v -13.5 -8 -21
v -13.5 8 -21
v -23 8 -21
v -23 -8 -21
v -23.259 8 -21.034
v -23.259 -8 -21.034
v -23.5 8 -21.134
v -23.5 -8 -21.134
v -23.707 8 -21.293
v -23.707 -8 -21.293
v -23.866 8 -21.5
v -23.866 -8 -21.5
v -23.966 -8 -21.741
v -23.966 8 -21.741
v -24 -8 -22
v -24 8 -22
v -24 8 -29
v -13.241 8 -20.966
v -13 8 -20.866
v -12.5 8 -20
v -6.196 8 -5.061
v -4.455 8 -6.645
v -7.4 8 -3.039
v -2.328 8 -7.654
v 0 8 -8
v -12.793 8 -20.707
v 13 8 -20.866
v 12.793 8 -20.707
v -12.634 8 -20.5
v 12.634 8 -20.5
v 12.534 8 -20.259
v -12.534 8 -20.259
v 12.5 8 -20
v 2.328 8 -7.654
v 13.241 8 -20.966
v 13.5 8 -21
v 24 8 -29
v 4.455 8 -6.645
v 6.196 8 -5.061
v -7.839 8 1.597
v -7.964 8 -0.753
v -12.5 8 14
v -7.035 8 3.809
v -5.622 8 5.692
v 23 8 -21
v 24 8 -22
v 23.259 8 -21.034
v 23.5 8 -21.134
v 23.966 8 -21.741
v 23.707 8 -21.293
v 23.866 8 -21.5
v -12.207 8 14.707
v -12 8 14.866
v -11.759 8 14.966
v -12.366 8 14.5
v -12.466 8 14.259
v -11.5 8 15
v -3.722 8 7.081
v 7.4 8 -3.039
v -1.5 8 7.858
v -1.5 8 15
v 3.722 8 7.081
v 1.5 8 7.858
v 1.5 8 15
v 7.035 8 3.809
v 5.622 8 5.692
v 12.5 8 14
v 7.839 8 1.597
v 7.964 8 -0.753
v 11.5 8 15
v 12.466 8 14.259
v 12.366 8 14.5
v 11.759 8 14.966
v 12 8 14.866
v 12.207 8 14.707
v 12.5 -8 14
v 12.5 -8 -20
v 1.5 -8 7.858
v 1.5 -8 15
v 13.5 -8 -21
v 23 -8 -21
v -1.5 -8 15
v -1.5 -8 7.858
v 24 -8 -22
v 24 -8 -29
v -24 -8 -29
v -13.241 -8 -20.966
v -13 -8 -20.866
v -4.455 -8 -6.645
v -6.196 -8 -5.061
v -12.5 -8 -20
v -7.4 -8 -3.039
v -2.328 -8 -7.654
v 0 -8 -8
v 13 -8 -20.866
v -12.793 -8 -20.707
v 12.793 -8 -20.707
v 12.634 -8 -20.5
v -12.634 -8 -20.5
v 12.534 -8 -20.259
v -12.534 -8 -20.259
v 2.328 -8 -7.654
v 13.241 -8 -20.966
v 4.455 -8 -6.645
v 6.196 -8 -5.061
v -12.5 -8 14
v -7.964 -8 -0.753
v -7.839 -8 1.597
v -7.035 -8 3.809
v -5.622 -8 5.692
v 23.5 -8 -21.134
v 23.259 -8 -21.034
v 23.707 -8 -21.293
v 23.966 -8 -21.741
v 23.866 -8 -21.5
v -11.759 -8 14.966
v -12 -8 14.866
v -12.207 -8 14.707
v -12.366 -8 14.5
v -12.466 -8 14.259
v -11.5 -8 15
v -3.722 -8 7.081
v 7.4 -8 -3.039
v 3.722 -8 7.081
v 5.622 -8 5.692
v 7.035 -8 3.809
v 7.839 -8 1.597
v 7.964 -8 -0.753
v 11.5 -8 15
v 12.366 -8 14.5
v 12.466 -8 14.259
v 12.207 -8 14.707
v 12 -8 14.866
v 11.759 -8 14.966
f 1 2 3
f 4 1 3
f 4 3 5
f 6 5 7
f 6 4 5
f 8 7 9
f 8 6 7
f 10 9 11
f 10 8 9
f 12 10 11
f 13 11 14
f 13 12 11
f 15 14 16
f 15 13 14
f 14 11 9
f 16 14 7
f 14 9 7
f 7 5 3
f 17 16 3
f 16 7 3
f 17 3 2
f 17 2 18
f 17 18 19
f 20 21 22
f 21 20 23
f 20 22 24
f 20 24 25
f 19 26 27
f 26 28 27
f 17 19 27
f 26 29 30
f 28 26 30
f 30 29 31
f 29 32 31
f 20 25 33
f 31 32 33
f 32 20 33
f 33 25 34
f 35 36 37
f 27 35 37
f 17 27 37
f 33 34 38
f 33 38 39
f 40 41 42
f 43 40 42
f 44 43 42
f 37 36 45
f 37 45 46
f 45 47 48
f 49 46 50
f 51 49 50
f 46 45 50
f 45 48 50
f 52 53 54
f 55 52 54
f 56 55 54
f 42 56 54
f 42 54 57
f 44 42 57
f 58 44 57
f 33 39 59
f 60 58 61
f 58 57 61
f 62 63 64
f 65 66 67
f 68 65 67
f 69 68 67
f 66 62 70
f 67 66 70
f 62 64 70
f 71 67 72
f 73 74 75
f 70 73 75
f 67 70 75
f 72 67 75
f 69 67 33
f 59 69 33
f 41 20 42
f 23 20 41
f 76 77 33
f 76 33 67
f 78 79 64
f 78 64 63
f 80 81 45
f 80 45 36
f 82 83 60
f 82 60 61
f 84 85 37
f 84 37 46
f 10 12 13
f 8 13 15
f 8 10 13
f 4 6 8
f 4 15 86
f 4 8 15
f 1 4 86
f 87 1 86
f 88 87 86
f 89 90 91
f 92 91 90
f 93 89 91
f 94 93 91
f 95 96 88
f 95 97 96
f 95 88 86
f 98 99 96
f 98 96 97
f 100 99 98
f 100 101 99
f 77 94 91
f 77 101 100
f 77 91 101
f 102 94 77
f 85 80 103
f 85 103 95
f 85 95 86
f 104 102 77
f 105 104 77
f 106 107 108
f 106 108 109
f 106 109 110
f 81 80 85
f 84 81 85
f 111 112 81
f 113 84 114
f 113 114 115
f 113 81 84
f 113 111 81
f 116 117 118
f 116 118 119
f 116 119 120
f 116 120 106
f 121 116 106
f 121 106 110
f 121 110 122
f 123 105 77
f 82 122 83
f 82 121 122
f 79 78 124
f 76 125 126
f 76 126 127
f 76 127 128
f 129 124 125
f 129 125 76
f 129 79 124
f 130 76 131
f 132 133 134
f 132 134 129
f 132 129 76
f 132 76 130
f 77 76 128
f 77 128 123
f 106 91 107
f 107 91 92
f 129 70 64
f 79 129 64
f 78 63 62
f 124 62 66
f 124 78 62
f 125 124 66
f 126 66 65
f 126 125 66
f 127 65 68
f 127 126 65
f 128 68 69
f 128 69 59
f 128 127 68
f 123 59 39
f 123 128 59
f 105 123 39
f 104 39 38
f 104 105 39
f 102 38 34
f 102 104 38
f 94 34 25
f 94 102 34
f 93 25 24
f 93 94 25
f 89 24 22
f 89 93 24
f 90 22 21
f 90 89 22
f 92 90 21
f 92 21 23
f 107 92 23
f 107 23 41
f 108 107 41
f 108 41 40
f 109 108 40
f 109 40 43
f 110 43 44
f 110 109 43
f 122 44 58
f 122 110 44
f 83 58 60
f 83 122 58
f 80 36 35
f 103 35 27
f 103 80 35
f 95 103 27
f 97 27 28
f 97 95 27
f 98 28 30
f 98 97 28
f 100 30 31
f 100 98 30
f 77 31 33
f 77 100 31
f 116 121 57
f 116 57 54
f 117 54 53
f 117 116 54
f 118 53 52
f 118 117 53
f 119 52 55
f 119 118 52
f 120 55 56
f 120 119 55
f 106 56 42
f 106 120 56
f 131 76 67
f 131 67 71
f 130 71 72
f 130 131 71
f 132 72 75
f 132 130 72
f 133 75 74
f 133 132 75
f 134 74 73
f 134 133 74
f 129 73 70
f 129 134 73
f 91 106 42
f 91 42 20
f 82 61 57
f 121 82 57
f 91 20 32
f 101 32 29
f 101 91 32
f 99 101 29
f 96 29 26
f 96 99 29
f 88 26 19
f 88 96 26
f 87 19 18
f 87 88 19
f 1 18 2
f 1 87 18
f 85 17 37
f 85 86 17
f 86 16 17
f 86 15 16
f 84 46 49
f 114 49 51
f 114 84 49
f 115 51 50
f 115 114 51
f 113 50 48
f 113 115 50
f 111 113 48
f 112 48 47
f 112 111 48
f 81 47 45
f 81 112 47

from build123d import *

# Parameters (mm, degrees)
F1_DEPTH = 8


with BuildPart() as f1:
    # F0 (on Front) → F1 (new body, symmetric)
    with BuildSketch(Plane.XZ):
        with BuildLine():
            Line((-24, -29), (24, -29))
            Line((24, -29), (24, -22))
            ThreePointArc((24, -22), (23.707107, -21.292893), (23, -21))
            Line((23, -21), (13.5, -21))
            ThreePointArc((13.5, -21), (12.792893, -20.707107), (12.5, -20))
            Line((12.5, -20), (12.5, 14))
            ThreePointArc((12.5, 14), (12.207107, 14.707107), (11.5, 15))
            Line((11.5, 15), (1.5, 15))
            Line((1.5, 15), (1.5, 7.858117))
            ThreePointArc((1.5, 7.858117), (0, -8), (-1.5, 7.858117))
            Line((-1.5, 7.858117), (-1.5, 15))
            Line((-1.5, 15), (-11.5, 15))
            ThreePointArc((-11.5, 15), (-12.207107, 14.707107), (-12.5, 14))
            Line((-12.5, 14), (-12.5, -20))
            ThreePointArc((-12.5, -20), (-12.792893, -20.707107), (-13.5, -21))
            Line((-13.5, -21), (-23, -21))
            ThreePointArc((-23, -21), (-23.707107, -21.292893), (-24, -22))
            Line((-24, -22), (-24, -29))
        make_face()
    extrude(amount=F1_DEPTH, both=True)


solid = f1.part
